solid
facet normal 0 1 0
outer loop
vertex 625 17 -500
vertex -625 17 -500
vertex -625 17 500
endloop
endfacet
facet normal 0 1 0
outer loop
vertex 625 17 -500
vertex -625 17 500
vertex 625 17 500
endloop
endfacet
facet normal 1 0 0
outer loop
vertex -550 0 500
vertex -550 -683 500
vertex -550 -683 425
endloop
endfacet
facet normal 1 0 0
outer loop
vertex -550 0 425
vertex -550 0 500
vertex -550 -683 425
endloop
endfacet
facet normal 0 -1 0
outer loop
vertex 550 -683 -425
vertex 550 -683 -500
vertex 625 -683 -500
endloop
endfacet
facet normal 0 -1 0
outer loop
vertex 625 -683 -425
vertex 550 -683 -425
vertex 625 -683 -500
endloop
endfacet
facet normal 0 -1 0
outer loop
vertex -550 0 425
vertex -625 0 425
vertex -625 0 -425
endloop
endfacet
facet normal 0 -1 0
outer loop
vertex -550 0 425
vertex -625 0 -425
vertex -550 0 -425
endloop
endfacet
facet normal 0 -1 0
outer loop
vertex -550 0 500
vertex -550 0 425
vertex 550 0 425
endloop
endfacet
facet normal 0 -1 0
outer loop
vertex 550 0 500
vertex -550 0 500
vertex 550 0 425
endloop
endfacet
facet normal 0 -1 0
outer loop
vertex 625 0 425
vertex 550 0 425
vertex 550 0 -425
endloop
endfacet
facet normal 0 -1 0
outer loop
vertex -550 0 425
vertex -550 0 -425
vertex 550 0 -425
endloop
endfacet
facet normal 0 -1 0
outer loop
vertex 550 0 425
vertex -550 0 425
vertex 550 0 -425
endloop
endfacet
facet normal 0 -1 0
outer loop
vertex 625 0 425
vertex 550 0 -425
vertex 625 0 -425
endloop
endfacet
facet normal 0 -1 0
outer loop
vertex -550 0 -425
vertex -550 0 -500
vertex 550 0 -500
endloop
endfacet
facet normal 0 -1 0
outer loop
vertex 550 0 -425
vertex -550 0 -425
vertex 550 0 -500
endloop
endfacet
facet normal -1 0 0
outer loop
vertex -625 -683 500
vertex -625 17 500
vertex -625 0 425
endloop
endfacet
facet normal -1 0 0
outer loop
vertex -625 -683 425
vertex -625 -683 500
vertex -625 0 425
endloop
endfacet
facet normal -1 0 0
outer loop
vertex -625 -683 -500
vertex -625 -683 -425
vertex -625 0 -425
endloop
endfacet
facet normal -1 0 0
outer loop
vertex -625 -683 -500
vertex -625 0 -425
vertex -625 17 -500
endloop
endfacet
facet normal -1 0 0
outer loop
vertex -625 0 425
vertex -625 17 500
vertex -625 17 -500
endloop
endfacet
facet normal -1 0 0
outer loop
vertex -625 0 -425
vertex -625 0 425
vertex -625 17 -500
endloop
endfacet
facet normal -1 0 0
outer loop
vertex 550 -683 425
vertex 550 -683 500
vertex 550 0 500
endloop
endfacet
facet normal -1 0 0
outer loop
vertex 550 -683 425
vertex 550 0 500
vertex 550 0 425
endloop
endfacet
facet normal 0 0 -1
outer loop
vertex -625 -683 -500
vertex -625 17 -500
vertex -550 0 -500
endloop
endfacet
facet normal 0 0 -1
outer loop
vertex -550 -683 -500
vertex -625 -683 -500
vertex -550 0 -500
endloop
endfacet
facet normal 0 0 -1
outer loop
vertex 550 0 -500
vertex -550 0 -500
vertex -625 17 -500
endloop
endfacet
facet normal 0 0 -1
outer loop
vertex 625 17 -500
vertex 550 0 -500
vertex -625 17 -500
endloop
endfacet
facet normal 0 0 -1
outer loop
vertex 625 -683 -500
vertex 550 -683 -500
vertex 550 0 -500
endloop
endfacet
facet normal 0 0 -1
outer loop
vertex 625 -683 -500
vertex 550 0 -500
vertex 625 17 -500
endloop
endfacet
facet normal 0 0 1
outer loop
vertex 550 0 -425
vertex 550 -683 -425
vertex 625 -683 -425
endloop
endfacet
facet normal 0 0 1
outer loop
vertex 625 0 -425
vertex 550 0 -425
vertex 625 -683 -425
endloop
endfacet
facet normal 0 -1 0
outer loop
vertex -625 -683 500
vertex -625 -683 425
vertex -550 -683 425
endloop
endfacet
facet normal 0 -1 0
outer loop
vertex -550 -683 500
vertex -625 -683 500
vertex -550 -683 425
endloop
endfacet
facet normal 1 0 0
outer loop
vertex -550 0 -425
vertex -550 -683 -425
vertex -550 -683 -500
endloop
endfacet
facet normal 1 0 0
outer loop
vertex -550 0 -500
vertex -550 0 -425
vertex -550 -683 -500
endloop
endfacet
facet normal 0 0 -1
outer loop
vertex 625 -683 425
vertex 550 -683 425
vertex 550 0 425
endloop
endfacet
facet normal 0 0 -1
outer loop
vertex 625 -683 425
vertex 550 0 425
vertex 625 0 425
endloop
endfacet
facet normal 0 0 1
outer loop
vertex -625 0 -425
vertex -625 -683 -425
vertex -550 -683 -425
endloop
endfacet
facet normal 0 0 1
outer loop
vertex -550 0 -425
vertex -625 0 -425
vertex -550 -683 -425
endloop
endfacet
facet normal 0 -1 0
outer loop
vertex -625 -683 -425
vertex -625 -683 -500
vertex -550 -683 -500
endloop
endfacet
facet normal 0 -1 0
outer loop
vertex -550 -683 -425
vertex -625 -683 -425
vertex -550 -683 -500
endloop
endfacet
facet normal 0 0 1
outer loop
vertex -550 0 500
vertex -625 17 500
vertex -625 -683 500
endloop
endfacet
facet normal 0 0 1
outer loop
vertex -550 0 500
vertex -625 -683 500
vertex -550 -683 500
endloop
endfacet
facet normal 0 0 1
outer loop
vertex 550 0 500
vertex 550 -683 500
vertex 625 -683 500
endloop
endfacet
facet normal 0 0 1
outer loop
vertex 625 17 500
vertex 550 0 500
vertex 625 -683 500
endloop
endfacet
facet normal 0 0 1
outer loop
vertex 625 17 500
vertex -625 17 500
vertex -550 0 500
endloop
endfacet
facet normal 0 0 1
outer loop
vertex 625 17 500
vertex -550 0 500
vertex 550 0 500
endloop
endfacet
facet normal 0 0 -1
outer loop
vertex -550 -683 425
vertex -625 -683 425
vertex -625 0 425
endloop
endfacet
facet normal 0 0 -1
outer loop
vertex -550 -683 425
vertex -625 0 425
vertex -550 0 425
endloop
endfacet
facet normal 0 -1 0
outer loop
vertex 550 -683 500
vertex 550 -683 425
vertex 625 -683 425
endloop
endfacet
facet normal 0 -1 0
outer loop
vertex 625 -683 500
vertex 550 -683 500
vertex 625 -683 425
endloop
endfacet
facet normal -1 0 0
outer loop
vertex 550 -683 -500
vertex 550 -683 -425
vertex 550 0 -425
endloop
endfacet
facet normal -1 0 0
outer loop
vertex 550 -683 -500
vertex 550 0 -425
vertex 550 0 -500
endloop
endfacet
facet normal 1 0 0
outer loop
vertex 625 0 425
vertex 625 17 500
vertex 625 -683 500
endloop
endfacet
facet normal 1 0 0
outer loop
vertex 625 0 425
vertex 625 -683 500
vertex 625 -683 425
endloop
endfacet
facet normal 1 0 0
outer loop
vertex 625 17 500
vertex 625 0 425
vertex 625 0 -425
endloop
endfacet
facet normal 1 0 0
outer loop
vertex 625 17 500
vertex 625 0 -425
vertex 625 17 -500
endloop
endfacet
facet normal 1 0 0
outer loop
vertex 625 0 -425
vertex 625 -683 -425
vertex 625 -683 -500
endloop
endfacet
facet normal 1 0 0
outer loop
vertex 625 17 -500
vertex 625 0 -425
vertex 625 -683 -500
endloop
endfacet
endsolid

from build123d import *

# Parameters (mm, degrees)
CROQUIS1_W              = 1250
CROQUIS1_H              = 1000
SALIENTE_EXTRUIR1_DEPTH = 17
CROQUIS2_W              = 75
CROQUIS2_H              = 75
SALIENTE_EXTRUIR2_DEPTH = 700


with BuildPart() as part:
    # Croquis1 → Saliente-Extruir1 (new body)
    with BuildSketch(Plane(origin=(0, 0, 0), x_dir=(1, 0, 0), z_dir=(0, 1, 0))):
        Rectangle(CROQUIS1_W, CROQUIS1_H)
    extrude(amount=SALIENTE_EXTRUIR1_DEPTH)

    # Croquis2 → Saliente-Extruir2 (add)
    with BuildSketch(Plane(origin=(0, 17, 0), x_dir=(1, 0, 0), z_dir=(0, 1, 0))):
        with Locations((-587.5, -462.5)):
            Rectangle(CROQUIS2_W, CROQUIS2_H)
        with Locations((-587.5, 462.5)):
            Rectangle(CROQUIS2_W, CROQUIS2_H)
        with Locations((587.5, -462.5)):
            Rectangle(CROQUIS2_W, CROQUIS2_H)
        with Locations((587.5, 462.5)):
            Rectangle(CROQUIS2_W, CROQUIS2_H)
    extrude(amount=-SALIENTE_EXTRUIR2_DEPTH)


solid = part.part
